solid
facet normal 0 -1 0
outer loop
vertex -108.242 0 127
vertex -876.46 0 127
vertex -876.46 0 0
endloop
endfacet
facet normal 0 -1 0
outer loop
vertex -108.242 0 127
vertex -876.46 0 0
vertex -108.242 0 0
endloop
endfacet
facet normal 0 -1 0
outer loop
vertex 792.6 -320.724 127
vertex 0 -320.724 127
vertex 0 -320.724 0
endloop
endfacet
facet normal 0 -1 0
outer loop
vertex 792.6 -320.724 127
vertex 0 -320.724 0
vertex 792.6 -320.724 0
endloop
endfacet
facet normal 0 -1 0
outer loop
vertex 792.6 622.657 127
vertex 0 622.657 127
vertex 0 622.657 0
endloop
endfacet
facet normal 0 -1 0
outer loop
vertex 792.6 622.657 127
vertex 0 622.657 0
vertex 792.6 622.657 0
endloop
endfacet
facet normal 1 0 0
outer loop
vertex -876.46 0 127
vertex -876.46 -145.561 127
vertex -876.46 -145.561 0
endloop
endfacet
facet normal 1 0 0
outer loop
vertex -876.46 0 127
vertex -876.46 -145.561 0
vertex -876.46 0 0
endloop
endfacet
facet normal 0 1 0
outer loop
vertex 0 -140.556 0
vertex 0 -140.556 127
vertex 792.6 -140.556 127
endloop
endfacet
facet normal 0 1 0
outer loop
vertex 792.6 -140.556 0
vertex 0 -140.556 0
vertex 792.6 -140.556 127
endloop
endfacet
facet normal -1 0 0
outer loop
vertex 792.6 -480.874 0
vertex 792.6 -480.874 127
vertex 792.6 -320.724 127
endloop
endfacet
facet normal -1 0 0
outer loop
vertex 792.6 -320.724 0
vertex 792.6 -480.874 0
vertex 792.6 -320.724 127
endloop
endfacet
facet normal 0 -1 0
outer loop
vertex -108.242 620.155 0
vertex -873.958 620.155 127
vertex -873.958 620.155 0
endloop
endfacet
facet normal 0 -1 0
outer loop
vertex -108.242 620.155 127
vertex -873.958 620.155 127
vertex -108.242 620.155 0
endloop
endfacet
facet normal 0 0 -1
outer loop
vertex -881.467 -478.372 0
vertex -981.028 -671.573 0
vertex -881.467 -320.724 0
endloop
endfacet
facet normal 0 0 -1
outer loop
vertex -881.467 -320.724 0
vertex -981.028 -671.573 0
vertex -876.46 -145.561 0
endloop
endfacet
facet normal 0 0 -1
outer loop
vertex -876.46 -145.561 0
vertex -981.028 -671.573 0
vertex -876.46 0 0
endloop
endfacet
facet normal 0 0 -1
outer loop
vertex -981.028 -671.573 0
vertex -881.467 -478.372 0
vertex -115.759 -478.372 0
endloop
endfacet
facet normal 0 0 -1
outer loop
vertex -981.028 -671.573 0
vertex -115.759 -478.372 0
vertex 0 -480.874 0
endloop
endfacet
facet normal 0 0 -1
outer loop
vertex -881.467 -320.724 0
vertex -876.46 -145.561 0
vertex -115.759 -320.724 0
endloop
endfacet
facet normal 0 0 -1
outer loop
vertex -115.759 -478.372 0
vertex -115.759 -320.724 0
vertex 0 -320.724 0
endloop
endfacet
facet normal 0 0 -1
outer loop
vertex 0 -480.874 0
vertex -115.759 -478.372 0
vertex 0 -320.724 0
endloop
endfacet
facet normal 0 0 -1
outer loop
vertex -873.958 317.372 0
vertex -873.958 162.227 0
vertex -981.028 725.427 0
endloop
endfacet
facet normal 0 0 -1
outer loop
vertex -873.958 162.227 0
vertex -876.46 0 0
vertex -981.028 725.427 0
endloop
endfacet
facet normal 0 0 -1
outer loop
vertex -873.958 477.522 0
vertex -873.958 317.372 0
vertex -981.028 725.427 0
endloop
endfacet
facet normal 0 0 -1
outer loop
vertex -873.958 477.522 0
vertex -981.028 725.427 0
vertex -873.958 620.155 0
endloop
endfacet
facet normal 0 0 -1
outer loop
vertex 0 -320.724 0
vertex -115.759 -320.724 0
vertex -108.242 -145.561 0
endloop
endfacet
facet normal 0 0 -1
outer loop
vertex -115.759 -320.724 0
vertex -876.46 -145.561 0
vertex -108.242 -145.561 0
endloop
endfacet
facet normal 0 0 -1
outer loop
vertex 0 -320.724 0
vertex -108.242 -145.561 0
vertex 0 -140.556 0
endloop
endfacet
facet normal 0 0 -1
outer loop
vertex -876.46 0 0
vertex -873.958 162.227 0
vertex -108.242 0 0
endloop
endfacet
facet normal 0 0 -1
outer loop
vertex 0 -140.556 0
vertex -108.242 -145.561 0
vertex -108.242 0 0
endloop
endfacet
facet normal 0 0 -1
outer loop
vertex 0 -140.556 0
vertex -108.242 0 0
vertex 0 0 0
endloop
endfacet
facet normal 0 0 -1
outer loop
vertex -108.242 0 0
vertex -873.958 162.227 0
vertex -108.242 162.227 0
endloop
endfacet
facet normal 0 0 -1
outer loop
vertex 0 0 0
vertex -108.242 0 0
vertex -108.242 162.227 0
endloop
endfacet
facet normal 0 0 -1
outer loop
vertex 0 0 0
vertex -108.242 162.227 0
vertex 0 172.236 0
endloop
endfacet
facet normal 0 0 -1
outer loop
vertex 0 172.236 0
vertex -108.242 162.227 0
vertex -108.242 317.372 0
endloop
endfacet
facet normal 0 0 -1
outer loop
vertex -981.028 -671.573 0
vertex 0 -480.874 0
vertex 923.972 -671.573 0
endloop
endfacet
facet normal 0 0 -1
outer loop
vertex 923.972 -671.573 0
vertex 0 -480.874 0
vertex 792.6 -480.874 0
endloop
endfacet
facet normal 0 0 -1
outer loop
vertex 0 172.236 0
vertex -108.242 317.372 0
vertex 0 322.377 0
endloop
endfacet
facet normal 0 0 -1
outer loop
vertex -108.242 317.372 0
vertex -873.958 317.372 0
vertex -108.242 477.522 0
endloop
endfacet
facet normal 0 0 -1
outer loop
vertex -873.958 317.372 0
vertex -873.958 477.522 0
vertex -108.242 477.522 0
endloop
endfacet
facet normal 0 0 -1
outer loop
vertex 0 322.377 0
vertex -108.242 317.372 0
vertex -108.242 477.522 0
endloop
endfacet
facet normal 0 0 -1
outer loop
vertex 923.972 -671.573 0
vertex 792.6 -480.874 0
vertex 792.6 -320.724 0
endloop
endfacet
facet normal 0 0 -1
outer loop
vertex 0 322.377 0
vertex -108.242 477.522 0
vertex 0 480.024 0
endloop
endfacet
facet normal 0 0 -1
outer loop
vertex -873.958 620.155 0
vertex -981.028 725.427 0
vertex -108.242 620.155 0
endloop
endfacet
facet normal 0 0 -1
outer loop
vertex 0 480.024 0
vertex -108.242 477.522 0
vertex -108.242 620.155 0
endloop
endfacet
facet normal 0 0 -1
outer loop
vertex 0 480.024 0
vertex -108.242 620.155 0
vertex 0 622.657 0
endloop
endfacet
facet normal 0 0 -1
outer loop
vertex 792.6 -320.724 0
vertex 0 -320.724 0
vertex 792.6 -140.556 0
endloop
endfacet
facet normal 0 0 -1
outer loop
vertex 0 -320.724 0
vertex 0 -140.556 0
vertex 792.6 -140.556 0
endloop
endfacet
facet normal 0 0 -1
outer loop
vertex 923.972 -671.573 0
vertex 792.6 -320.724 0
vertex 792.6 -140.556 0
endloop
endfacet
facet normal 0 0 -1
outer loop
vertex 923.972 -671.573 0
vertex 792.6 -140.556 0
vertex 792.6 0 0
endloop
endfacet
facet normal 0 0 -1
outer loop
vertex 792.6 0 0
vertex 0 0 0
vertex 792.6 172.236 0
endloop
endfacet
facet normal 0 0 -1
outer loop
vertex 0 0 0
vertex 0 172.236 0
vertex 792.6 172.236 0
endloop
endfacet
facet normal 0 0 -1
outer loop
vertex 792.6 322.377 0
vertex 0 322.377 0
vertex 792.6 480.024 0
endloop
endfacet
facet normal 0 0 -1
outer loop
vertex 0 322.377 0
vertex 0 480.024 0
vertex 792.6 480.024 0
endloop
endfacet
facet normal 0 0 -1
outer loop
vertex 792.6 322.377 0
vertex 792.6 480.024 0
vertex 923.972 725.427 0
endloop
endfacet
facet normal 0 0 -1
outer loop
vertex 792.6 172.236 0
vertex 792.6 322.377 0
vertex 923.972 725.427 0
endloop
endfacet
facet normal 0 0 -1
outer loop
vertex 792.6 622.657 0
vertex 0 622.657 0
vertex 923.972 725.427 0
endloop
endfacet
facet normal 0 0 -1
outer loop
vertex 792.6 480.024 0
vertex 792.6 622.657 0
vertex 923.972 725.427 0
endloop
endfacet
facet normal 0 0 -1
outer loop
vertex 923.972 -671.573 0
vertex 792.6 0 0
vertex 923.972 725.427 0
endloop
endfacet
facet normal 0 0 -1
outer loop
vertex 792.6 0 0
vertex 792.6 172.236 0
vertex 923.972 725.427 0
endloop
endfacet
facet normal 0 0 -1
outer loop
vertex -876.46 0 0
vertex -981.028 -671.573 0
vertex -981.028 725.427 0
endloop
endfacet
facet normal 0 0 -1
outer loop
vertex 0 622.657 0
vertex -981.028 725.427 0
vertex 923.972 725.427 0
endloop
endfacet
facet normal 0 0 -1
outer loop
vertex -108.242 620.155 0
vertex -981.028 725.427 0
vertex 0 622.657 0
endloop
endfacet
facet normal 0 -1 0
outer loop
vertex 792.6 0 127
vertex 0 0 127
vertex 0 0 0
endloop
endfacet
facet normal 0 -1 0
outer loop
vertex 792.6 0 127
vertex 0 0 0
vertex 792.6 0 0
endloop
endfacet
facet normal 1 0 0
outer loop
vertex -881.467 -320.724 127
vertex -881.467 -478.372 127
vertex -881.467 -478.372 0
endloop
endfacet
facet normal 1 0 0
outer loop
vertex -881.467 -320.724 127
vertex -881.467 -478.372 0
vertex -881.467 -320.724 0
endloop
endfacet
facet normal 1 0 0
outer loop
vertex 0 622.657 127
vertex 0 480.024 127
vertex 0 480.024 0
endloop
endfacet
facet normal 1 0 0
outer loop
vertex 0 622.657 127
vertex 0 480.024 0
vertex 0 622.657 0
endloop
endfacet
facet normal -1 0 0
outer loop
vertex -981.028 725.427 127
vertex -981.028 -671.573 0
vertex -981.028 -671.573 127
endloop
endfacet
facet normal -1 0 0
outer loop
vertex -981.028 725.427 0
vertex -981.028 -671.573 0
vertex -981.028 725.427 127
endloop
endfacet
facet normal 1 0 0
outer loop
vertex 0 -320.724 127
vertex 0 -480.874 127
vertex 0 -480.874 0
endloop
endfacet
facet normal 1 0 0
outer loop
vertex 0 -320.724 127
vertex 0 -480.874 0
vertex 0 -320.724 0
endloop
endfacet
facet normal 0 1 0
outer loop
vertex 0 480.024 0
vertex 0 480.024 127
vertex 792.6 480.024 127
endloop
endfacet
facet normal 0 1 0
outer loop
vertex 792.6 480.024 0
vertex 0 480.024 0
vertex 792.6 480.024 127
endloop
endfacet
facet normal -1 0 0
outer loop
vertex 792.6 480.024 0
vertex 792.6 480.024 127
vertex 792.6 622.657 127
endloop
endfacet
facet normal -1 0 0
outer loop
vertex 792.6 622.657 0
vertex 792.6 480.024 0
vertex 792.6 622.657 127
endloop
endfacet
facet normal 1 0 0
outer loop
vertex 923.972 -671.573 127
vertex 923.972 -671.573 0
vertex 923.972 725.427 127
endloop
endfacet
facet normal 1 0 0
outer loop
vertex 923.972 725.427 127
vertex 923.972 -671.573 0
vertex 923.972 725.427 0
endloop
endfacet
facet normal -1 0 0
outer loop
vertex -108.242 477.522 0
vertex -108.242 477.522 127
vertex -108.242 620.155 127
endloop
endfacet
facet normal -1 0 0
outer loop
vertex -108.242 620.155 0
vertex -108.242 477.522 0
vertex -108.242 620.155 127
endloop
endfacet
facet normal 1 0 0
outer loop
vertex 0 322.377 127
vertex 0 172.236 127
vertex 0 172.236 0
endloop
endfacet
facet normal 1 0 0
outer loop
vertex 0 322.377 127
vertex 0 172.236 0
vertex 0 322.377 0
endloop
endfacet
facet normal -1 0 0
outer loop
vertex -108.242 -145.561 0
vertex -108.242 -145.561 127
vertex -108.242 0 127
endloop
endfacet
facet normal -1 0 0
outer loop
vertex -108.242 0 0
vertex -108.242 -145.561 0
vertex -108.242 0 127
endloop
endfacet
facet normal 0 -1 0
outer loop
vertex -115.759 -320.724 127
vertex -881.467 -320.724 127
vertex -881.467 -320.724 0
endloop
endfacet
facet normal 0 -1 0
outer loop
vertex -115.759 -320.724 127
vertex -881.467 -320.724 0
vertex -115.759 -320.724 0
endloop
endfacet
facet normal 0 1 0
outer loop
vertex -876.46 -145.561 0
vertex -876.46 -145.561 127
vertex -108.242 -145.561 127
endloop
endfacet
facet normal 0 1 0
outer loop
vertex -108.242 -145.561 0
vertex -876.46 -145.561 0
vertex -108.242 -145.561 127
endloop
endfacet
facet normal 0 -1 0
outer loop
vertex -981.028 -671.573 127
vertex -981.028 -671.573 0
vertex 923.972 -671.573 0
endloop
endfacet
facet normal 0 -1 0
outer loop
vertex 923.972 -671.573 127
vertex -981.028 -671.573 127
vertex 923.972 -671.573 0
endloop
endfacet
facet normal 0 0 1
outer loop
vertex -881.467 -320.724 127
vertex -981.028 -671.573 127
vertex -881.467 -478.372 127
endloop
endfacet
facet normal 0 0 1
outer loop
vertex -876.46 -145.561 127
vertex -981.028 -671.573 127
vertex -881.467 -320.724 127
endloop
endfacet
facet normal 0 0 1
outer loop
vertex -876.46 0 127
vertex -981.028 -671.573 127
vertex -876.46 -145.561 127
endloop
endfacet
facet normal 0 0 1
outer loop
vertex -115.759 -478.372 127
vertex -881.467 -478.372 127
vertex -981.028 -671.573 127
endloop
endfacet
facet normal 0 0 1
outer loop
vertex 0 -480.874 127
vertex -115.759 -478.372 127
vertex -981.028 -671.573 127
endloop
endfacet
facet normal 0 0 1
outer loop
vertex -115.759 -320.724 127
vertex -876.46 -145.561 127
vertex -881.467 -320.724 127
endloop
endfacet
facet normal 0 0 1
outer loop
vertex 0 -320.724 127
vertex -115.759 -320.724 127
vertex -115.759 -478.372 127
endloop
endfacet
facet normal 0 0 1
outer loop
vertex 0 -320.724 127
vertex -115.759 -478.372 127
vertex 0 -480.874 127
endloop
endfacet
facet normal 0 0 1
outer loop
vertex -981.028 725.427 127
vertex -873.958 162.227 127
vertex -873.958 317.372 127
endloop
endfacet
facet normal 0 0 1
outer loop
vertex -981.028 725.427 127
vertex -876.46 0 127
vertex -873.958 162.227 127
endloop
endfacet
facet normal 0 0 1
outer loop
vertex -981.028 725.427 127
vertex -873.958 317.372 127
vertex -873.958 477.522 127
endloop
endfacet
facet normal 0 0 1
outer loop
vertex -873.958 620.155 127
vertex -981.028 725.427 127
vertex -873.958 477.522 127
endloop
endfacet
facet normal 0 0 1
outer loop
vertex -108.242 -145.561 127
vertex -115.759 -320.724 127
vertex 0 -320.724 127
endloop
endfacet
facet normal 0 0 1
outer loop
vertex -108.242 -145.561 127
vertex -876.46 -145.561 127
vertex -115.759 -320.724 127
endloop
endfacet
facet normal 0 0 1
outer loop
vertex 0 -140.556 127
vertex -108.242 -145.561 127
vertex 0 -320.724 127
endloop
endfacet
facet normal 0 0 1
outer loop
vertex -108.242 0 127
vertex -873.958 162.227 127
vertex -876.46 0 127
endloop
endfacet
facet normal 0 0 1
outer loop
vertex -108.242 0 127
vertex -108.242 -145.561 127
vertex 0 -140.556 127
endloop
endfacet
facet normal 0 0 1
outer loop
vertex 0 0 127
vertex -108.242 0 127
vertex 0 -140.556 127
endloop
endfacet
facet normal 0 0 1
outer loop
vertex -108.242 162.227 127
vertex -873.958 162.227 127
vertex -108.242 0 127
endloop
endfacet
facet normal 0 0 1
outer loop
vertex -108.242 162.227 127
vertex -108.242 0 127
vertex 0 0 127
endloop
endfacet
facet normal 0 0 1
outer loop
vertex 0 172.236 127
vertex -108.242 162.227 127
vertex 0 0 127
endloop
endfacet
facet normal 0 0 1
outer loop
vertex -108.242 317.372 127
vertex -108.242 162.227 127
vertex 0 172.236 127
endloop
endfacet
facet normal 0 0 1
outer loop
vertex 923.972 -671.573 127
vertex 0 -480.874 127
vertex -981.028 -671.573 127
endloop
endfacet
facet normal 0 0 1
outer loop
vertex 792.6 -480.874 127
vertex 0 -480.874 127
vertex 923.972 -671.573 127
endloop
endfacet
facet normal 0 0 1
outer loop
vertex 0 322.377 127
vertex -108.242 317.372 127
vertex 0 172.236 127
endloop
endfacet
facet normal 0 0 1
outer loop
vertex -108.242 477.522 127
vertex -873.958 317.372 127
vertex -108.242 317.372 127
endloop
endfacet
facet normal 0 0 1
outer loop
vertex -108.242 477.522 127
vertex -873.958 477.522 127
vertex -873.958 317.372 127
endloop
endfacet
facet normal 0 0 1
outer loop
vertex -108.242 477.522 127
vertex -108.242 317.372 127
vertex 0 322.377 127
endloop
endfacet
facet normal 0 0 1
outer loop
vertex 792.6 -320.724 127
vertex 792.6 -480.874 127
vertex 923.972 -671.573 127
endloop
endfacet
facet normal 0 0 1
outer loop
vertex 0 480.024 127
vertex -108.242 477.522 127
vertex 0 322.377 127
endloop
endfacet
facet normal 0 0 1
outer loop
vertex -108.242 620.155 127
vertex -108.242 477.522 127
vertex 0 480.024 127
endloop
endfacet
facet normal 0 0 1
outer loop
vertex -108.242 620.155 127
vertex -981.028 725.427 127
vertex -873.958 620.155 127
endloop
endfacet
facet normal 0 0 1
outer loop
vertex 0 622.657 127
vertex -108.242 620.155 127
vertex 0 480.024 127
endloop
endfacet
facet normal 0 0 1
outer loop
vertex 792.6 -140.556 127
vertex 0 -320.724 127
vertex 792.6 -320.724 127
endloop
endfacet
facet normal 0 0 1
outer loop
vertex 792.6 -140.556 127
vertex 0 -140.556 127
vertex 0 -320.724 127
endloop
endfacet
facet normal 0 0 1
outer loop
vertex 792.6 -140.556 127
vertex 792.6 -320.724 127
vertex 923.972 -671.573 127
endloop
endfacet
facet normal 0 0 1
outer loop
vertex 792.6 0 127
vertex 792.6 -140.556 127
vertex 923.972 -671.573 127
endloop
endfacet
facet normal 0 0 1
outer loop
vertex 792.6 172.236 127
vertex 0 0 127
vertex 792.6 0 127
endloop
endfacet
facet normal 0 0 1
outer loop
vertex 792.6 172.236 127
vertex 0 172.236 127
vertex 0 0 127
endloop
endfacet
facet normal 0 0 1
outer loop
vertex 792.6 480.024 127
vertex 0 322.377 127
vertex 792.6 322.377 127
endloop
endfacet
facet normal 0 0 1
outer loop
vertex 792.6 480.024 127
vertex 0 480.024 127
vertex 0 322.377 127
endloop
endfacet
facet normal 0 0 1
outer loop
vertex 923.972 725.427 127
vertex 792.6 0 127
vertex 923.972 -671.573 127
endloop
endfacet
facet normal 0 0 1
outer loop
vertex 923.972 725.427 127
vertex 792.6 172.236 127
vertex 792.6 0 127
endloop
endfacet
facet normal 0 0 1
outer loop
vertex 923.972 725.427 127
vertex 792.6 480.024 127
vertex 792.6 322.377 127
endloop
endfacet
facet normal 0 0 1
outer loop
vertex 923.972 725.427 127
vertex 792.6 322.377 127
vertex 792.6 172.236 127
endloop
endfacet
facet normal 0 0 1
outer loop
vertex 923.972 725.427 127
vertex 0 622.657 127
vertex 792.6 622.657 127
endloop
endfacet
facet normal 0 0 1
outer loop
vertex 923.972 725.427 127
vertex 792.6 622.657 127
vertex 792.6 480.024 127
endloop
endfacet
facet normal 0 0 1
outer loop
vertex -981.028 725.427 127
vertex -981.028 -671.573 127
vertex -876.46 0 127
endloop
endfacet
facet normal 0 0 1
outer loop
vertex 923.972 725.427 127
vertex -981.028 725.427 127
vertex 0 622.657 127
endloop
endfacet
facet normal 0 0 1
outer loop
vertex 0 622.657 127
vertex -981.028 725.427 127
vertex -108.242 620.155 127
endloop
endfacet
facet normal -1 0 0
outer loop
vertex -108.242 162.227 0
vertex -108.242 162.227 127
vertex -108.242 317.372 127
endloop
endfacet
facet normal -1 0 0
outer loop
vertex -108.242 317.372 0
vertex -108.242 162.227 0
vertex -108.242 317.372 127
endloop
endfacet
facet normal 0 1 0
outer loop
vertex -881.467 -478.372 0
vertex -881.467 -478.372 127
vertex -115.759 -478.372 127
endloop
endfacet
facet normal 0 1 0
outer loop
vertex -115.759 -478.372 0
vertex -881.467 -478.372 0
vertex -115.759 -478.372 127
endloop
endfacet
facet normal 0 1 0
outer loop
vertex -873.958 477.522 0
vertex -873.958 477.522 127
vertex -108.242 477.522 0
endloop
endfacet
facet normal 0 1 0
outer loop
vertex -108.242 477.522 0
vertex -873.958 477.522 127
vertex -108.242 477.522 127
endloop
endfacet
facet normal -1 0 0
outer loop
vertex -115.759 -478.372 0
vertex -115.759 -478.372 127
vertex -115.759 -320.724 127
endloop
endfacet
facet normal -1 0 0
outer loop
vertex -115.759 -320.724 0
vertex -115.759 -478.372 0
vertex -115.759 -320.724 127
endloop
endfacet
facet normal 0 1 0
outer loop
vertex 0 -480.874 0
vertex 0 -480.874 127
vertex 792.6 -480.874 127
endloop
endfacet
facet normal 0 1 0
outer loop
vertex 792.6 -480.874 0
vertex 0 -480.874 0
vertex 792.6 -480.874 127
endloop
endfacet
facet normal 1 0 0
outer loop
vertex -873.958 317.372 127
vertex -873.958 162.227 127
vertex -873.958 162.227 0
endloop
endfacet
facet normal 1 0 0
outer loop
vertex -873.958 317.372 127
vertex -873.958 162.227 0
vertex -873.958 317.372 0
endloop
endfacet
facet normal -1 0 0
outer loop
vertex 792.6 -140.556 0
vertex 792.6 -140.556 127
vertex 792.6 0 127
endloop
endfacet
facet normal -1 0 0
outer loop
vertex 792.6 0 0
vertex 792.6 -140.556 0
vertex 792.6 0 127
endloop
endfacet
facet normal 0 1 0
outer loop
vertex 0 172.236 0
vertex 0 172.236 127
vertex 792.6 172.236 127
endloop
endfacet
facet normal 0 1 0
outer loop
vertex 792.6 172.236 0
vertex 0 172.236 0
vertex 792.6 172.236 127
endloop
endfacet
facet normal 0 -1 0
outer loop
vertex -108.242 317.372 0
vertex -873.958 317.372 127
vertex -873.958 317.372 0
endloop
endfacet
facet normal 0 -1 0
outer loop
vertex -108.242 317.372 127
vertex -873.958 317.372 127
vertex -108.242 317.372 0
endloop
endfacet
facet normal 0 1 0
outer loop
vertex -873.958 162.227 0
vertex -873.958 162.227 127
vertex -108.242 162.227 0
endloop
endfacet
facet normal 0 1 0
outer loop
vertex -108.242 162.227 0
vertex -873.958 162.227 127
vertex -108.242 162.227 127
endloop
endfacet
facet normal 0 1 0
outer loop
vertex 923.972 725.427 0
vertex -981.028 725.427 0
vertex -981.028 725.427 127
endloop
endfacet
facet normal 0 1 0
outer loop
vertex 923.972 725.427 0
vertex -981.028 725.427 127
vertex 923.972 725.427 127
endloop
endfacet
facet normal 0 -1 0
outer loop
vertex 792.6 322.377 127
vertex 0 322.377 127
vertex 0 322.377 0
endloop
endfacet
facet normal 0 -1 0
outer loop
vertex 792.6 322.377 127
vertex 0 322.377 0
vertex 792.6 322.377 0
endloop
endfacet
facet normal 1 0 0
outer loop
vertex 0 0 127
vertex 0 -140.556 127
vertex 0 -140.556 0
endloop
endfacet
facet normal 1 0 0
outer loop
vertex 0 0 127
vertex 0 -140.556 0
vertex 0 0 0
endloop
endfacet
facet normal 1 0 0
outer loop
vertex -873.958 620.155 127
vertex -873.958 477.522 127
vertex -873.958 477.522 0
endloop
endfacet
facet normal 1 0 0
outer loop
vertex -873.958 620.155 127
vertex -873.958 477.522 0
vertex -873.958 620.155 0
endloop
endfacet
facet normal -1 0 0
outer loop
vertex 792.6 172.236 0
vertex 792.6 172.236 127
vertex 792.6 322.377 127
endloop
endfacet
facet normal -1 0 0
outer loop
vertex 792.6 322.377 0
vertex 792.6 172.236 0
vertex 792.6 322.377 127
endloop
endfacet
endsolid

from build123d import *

# Parameters (mm, degrees)
F0_W     = 1905
F0_H     = 1397
F1_DEPTH = 127
F2_W     = 765.71583
F2_H     = 142.633289
F2_W_2   = 792.600095
F2_H_2   = 142.633319
F2_H_3   = 155.145049
F2_H_4   = 150.14036
F2_H_5   = 140.555978
F2_W_3   = 768.218152
F2_H_6   = 145.560652
F2_W_4   = 765.7084
F2_H_7   = 157.647371
F2_H_8   = 160.149634
F3_DEPTH = 127.001


with BuildPart() as f1:
    # F0 (on Top) → F1 (new body)
    with BuildSketch(Plane.XY):
        with Locations((-28.528064, 26.927372)):
            Rectangle(F0_W, F0_H)
    extrude(amount=F1_DEPTH)

    # F2 (on face) → F3 (cut, through all)
    with BuildSketch(Plane.XY.offset(127)):
        with Locations((-491.099898, 548.838452)):
            Rectangle(F2_W, F2_H)
        with Locations((396.300048, 551.340818)):
            Rectangle(F2_W_2, F2_H_2)
        with Locations((-491.099898, 239.799588)):
            Rectangle(F2_W, F2_H_3)
        with Locations((396.300048, 247.306608)):
            Rectangle(F2_W_2, F2_H_4)
        with Locations((396.300048, -70.277989)):
            Rectangle(F2_W_2, F2_H_5)
        with Locations((-492.351059, -72.780326)):
            Rectangle(F2_W_3, F2_H_6)
        with Locations((-498.613023, -399.548113)):
            Rectangle(F2_W_4, F2_H_7)
        with Locations((396.300048, -400.799245)):
            Rectangle(F2_W_2, F2_H_8)
    extrude(amount=-F3_DEPTH, mode=Mode.SUBTRACT)


solid = f1.part
